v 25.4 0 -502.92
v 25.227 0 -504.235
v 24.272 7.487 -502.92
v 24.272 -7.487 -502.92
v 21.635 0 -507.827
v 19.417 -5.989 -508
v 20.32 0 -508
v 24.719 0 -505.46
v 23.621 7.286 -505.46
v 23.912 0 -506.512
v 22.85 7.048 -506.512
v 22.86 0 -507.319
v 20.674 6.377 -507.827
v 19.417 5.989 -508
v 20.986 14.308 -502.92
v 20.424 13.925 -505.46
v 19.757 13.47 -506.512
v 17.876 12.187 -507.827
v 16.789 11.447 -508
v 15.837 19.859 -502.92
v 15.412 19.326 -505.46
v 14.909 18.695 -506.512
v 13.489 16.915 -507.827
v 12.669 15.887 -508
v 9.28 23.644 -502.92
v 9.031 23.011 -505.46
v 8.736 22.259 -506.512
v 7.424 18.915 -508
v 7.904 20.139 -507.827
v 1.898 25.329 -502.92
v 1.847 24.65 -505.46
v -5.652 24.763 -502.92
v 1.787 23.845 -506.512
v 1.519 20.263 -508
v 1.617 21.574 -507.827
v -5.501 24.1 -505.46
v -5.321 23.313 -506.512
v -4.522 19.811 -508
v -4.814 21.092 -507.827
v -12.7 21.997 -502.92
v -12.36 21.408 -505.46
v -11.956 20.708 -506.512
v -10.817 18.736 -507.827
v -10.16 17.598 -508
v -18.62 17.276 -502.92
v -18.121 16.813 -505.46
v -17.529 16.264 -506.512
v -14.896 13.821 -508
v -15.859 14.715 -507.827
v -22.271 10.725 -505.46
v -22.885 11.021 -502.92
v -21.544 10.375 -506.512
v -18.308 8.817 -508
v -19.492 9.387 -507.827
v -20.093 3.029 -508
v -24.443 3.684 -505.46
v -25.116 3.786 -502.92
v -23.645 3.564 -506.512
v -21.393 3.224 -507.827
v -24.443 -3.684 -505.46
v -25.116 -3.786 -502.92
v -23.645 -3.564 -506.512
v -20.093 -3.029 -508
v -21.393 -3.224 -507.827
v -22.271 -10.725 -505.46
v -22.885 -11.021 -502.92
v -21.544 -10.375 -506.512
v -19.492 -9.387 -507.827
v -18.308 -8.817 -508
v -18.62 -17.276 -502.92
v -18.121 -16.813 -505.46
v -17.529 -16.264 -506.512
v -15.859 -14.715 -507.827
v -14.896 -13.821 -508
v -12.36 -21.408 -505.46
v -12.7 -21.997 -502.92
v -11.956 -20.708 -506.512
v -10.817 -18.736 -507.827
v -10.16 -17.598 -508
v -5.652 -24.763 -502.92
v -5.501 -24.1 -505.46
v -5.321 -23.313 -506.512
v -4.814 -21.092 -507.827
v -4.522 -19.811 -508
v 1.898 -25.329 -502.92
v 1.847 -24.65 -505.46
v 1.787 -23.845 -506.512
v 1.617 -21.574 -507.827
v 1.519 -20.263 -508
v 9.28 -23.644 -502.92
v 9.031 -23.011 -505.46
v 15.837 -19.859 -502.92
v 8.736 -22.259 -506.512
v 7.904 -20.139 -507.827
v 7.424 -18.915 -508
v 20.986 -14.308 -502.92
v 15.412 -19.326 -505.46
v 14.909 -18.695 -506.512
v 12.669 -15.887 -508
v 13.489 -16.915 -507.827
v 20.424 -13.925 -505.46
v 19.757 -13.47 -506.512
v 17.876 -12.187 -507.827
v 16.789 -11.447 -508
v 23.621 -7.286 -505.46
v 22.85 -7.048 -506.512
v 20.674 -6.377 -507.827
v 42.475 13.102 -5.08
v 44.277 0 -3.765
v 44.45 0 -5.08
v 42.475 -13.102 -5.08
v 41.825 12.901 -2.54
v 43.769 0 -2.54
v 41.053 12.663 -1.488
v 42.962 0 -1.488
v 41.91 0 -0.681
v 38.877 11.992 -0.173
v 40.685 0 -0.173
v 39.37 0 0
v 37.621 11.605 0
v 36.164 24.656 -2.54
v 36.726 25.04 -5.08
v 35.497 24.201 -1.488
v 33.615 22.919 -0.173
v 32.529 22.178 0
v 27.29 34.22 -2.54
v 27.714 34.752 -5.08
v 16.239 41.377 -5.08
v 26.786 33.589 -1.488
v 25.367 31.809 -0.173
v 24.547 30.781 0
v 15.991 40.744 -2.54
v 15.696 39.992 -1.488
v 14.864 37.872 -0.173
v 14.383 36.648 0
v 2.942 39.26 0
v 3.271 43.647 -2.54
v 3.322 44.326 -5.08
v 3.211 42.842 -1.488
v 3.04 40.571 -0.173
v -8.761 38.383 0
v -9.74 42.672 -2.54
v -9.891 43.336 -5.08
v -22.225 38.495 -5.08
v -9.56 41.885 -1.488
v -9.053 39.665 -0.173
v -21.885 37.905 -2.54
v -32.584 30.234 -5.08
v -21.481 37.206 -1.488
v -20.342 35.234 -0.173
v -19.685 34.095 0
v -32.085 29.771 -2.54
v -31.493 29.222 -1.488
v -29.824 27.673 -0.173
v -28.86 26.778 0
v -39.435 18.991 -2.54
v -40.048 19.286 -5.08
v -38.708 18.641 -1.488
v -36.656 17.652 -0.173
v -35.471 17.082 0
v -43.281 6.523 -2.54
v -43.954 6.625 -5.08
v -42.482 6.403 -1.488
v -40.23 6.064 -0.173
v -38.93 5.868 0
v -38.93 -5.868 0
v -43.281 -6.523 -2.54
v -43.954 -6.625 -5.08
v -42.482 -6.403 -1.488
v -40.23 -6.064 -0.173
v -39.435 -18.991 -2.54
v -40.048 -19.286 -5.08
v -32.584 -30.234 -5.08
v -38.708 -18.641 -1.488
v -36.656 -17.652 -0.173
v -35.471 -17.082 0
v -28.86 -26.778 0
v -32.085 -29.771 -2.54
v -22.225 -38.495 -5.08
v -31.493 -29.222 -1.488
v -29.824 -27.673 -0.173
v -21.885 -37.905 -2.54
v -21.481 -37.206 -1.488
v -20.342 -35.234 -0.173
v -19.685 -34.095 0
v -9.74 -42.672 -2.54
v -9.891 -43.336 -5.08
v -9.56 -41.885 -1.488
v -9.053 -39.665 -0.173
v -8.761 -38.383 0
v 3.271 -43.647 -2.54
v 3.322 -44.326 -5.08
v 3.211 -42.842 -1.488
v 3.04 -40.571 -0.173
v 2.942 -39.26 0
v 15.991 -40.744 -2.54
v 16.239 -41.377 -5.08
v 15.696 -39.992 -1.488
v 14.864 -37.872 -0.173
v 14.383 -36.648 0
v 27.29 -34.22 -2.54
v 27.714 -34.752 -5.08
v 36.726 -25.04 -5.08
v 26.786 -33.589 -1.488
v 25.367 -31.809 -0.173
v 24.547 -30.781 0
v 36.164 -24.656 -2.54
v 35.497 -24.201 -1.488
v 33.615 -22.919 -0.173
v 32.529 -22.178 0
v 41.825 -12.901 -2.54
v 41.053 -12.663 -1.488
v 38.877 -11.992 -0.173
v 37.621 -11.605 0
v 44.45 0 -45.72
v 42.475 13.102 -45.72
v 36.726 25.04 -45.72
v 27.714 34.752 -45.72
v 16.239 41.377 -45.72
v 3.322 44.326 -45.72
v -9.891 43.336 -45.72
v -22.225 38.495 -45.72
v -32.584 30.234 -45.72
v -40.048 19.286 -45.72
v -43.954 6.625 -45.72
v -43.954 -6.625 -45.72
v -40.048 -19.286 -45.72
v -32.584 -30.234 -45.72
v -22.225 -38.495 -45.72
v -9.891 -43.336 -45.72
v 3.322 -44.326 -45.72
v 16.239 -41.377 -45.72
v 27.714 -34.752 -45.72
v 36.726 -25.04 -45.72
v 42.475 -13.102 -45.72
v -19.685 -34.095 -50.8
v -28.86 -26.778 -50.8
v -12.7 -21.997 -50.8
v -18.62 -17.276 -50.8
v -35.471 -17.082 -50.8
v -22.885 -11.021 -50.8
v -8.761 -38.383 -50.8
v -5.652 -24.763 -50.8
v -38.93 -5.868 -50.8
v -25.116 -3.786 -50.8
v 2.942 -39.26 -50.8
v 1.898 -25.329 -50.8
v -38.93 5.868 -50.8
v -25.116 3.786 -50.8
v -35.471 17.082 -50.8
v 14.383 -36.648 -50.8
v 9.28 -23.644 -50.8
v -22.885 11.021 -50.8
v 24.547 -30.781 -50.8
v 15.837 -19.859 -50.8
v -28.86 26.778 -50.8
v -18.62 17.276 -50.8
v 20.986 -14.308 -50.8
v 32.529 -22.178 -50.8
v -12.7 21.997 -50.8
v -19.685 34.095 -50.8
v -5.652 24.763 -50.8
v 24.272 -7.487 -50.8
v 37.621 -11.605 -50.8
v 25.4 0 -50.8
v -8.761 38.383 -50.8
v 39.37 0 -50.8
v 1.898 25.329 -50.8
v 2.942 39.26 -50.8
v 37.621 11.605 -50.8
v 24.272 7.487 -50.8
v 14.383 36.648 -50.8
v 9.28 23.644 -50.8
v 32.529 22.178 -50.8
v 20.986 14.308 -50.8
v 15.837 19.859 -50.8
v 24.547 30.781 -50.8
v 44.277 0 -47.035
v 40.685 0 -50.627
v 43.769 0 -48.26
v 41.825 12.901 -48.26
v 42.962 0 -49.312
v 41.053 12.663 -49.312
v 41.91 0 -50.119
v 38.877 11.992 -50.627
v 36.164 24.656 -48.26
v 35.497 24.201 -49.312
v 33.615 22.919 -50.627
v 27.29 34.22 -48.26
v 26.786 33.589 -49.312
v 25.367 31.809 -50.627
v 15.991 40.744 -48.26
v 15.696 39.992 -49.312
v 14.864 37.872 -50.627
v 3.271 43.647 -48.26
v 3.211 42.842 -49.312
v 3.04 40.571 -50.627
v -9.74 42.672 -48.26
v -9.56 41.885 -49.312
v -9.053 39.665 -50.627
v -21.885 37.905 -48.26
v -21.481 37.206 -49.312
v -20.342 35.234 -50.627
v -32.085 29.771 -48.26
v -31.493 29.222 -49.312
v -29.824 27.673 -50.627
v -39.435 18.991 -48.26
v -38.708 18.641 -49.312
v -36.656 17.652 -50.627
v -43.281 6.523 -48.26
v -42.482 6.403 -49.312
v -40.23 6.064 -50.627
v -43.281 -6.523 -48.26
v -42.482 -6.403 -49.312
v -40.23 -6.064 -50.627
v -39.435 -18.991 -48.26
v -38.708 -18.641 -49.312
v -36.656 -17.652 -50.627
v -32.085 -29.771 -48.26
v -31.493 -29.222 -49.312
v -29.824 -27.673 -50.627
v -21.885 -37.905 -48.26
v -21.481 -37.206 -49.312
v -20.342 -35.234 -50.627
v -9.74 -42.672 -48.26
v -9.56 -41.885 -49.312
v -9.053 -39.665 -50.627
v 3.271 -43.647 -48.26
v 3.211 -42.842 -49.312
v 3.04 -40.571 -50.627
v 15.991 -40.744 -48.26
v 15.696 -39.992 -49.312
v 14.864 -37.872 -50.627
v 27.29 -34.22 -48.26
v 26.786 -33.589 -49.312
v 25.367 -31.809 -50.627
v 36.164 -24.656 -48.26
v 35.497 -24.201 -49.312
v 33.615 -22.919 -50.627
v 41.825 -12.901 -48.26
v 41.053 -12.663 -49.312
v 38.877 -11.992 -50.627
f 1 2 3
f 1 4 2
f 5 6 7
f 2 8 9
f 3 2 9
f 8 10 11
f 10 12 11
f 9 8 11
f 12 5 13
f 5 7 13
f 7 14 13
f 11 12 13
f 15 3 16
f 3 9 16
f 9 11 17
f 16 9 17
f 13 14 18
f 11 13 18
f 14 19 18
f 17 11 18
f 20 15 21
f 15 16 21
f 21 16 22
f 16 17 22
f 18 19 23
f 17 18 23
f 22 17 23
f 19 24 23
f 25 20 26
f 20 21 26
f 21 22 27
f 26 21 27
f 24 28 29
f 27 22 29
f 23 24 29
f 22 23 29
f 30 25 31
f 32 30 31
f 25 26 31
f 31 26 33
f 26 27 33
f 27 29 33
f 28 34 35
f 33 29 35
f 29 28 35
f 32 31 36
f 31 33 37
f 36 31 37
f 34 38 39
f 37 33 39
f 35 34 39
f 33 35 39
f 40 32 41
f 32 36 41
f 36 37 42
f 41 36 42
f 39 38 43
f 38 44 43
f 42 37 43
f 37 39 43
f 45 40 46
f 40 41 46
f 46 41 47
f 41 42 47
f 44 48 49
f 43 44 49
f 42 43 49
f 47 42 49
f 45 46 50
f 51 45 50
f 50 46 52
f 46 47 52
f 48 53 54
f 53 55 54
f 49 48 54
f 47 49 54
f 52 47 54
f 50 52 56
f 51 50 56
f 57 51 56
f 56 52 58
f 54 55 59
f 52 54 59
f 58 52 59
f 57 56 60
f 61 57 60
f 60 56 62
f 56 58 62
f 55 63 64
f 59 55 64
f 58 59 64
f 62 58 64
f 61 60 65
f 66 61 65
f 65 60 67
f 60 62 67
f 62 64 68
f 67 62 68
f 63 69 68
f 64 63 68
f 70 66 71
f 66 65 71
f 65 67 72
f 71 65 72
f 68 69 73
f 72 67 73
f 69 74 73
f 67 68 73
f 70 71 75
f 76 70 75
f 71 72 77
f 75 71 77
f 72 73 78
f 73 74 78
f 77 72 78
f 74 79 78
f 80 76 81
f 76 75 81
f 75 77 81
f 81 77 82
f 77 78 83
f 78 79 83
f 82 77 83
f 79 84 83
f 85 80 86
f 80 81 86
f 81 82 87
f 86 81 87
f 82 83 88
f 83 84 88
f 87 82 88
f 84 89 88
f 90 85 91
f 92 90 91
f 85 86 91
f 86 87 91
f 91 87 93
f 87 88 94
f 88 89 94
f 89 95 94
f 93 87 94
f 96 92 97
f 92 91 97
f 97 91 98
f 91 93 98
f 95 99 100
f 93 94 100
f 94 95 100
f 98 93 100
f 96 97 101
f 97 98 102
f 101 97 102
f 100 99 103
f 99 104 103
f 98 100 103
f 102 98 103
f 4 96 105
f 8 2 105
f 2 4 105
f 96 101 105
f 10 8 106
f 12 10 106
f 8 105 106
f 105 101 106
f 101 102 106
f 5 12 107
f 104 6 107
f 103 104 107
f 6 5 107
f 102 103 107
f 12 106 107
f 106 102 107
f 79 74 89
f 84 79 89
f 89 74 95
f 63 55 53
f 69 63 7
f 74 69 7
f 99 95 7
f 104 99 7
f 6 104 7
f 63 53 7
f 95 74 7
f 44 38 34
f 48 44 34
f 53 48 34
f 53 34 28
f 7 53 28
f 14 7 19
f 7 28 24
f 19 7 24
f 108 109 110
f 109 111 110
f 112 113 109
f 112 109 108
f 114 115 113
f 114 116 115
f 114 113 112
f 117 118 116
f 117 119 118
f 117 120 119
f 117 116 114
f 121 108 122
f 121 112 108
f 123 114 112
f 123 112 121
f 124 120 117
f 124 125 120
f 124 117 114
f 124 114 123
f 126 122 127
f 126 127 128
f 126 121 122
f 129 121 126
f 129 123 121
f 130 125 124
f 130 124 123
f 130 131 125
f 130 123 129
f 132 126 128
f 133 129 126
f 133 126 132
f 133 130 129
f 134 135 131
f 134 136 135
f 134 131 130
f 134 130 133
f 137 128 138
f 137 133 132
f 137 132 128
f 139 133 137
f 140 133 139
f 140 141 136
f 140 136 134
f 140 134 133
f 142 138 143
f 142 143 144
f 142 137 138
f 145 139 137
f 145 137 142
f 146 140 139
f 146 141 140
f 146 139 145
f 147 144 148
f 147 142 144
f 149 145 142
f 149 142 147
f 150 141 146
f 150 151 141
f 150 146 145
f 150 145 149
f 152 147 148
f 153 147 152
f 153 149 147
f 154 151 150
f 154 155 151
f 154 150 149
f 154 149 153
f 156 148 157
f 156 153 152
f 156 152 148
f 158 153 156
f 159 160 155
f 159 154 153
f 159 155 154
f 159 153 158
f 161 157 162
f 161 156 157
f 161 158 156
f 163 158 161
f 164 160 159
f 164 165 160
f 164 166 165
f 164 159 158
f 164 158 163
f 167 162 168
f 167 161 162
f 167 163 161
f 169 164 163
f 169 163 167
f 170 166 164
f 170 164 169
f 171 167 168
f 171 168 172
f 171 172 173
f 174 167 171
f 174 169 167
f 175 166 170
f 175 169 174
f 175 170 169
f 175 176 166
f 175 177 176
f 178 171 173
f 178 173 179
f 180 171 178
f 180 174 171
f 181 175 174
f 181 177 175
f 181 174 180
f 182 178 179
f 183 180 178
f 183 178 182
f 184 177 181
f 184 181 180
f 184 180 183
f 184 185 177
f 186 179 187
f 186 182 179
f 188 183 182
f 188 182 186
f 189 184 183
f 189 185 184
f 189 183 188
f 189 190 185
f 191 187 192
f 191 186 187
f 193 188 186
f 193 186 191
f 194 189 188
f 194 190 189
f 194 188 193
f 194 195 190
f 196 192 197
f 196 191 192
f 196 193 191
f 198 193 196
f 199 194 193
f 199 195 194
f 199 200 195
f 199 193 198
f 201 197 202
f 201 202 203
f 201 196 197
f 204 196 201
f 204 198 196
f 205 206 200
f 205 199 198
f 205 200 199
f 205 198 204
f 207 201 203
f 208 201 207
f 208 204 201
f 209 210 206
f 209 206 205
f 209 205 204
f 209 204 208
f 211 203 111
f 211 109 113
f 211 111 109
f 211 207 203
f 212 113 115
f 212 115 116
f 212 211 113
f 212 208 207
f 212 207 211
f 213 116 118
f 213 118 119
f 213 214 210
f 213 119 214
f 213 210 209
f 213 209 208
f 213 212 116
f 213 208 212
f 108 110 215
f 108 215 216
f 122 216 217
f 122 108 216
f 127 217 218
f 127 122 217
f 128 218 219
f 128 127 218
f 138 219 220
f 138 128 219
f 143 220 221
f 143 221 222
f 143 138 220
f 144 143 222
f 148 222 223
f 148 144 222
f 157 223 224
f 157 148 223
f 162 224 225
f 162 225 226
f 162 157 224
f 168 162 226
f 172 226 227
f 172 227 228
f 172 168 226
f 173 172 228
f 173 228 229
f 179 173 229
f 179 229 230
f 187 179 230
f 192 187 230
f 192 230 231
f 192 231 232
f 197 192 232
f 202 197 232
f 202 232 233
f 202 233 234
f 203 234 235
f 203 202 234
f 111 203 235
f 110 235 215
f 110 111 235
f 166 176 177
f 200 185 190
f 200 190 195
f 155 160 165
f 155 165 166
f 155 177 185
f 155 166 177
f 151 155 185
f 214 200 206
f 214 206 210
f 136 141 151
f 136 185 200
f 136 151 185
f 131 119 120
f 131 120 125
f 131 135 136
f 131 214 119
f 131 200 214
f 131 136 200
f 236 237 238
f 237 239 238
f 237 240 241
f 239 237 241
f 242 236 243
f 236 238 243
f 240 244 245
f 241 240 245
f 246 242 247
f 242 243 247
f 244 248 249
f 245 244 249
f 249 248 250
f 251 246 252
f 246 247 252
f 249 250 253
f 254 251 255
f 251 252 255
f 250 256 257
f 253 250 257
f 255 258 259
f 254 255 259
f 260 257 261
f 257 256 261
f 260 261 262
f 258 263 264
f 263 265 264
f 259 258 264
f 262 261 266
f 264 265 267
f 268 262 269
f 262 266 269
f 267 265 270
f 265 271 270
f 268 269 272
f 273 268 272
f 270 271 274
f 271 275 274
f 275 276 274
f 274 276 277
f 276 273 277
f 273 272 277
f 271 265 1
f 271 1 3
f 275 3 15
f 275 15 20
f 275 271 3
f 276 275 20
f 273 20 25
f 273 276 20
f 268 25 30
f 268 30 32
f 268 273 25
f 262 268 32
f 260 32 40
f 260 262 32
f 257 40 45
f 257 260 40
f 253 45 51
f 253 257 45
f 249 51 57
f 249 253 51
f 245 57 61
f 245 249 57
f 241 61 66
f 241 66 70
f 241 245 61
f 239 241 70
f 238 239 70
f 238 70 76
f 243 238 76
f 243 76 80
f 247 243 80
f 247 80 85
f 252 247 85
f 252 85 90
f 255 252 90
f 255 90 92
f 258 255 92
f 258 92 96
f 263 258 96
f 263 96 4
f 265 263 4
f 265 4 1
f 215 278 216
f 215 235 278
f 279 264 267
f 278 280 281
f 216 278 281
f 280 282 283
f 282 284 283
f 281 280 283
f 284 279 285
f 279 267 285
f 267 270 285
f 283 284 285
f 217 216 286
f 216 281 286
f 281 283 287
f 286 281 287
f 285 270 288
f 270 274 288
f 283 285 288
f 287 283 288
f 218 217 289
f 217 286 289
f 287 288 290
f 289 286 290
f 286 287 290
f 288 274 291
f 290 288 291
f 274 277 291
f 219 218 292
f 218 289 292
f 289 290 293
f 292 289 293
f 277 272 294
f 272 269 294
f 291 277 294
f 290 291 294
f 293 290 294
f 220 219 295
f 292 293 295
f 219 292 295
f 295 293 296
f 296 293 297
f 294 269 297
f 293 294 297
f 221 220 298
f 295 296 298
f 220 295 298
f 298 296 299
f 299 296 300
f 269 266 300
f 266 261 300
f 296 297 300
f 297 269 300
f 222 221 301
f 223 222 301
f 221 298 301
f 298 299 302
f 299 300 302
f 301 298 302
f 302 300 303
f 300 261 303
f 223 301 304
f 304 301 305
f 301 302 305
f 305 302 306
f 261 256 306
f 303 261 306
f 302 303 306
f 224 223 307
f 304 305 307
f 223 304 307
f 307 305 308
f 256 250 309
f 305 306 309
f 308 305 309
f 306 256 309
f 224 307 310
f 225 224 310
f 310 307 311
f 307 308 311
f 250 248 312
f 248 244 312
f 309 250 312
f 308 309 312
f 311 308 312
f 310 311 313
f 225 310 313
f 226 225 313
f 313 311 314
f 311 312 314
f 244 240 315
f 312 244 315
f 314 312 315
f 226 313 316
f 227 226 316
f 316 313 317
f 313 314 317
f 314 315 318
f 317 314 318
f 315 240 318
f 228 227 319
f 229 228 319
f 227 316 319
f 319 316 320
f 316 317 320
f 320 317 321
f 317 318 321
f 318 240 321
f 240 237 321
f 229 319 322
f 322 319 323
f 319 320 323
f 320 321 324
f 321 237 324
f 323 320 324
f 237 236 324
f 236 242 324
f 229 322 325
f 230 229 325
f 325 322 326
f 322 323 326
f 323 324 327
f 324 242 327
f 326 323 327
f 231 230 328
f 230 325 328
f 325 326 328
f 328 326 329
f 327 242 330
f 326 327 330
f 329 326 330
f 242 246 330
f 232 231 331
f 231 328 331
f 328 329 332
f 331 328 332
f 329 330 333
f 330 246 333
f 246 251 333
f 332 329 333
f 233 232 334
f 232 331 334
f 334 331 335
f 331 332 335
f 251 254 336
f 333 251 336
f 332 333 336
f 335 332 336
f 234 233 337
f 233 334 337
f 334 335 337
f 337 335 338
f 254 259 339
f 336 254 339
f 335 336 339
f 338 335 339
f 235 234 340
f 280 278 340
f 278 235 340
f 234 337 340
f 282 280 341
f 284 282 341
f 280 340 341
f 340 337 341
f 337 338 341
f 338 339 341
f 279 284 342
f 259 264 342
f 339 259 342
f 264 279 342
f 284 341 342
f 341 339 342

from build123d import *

# Parameters (mm, degrees)
F0_R     = 25.4
F1_DEPTH = 508
F0_R_2   = 44.45
F2_DEPTH = 50.8
F3_R     = 5.08


with BuildPart() as f1:
    # F0 (on Top) → F1 (new body)
    with BuildSketch(Plane.XY):
        Circle(F0_R)
    extrude(amount=-F1_DEPTH)

    # F0 (on Top) → F2 (join)
    with BuildSketch(Plane.XY):
        Circle(F0_R_2)
        Circle(F0_R, mode=Mode.SUBTRACT)
    extrude(amount=-F2_DEPTH)

    # F3
    f3_edges = [f1.edges().sort_by_distance(p)[0] for p in [
        (-44.45, 0, -50.8),
        (-44.45, 0, 0),
        (-25.4, 0, -508),
    ]]
    fillet(f3_edges, radius=F3_R)


solid = f1.part
